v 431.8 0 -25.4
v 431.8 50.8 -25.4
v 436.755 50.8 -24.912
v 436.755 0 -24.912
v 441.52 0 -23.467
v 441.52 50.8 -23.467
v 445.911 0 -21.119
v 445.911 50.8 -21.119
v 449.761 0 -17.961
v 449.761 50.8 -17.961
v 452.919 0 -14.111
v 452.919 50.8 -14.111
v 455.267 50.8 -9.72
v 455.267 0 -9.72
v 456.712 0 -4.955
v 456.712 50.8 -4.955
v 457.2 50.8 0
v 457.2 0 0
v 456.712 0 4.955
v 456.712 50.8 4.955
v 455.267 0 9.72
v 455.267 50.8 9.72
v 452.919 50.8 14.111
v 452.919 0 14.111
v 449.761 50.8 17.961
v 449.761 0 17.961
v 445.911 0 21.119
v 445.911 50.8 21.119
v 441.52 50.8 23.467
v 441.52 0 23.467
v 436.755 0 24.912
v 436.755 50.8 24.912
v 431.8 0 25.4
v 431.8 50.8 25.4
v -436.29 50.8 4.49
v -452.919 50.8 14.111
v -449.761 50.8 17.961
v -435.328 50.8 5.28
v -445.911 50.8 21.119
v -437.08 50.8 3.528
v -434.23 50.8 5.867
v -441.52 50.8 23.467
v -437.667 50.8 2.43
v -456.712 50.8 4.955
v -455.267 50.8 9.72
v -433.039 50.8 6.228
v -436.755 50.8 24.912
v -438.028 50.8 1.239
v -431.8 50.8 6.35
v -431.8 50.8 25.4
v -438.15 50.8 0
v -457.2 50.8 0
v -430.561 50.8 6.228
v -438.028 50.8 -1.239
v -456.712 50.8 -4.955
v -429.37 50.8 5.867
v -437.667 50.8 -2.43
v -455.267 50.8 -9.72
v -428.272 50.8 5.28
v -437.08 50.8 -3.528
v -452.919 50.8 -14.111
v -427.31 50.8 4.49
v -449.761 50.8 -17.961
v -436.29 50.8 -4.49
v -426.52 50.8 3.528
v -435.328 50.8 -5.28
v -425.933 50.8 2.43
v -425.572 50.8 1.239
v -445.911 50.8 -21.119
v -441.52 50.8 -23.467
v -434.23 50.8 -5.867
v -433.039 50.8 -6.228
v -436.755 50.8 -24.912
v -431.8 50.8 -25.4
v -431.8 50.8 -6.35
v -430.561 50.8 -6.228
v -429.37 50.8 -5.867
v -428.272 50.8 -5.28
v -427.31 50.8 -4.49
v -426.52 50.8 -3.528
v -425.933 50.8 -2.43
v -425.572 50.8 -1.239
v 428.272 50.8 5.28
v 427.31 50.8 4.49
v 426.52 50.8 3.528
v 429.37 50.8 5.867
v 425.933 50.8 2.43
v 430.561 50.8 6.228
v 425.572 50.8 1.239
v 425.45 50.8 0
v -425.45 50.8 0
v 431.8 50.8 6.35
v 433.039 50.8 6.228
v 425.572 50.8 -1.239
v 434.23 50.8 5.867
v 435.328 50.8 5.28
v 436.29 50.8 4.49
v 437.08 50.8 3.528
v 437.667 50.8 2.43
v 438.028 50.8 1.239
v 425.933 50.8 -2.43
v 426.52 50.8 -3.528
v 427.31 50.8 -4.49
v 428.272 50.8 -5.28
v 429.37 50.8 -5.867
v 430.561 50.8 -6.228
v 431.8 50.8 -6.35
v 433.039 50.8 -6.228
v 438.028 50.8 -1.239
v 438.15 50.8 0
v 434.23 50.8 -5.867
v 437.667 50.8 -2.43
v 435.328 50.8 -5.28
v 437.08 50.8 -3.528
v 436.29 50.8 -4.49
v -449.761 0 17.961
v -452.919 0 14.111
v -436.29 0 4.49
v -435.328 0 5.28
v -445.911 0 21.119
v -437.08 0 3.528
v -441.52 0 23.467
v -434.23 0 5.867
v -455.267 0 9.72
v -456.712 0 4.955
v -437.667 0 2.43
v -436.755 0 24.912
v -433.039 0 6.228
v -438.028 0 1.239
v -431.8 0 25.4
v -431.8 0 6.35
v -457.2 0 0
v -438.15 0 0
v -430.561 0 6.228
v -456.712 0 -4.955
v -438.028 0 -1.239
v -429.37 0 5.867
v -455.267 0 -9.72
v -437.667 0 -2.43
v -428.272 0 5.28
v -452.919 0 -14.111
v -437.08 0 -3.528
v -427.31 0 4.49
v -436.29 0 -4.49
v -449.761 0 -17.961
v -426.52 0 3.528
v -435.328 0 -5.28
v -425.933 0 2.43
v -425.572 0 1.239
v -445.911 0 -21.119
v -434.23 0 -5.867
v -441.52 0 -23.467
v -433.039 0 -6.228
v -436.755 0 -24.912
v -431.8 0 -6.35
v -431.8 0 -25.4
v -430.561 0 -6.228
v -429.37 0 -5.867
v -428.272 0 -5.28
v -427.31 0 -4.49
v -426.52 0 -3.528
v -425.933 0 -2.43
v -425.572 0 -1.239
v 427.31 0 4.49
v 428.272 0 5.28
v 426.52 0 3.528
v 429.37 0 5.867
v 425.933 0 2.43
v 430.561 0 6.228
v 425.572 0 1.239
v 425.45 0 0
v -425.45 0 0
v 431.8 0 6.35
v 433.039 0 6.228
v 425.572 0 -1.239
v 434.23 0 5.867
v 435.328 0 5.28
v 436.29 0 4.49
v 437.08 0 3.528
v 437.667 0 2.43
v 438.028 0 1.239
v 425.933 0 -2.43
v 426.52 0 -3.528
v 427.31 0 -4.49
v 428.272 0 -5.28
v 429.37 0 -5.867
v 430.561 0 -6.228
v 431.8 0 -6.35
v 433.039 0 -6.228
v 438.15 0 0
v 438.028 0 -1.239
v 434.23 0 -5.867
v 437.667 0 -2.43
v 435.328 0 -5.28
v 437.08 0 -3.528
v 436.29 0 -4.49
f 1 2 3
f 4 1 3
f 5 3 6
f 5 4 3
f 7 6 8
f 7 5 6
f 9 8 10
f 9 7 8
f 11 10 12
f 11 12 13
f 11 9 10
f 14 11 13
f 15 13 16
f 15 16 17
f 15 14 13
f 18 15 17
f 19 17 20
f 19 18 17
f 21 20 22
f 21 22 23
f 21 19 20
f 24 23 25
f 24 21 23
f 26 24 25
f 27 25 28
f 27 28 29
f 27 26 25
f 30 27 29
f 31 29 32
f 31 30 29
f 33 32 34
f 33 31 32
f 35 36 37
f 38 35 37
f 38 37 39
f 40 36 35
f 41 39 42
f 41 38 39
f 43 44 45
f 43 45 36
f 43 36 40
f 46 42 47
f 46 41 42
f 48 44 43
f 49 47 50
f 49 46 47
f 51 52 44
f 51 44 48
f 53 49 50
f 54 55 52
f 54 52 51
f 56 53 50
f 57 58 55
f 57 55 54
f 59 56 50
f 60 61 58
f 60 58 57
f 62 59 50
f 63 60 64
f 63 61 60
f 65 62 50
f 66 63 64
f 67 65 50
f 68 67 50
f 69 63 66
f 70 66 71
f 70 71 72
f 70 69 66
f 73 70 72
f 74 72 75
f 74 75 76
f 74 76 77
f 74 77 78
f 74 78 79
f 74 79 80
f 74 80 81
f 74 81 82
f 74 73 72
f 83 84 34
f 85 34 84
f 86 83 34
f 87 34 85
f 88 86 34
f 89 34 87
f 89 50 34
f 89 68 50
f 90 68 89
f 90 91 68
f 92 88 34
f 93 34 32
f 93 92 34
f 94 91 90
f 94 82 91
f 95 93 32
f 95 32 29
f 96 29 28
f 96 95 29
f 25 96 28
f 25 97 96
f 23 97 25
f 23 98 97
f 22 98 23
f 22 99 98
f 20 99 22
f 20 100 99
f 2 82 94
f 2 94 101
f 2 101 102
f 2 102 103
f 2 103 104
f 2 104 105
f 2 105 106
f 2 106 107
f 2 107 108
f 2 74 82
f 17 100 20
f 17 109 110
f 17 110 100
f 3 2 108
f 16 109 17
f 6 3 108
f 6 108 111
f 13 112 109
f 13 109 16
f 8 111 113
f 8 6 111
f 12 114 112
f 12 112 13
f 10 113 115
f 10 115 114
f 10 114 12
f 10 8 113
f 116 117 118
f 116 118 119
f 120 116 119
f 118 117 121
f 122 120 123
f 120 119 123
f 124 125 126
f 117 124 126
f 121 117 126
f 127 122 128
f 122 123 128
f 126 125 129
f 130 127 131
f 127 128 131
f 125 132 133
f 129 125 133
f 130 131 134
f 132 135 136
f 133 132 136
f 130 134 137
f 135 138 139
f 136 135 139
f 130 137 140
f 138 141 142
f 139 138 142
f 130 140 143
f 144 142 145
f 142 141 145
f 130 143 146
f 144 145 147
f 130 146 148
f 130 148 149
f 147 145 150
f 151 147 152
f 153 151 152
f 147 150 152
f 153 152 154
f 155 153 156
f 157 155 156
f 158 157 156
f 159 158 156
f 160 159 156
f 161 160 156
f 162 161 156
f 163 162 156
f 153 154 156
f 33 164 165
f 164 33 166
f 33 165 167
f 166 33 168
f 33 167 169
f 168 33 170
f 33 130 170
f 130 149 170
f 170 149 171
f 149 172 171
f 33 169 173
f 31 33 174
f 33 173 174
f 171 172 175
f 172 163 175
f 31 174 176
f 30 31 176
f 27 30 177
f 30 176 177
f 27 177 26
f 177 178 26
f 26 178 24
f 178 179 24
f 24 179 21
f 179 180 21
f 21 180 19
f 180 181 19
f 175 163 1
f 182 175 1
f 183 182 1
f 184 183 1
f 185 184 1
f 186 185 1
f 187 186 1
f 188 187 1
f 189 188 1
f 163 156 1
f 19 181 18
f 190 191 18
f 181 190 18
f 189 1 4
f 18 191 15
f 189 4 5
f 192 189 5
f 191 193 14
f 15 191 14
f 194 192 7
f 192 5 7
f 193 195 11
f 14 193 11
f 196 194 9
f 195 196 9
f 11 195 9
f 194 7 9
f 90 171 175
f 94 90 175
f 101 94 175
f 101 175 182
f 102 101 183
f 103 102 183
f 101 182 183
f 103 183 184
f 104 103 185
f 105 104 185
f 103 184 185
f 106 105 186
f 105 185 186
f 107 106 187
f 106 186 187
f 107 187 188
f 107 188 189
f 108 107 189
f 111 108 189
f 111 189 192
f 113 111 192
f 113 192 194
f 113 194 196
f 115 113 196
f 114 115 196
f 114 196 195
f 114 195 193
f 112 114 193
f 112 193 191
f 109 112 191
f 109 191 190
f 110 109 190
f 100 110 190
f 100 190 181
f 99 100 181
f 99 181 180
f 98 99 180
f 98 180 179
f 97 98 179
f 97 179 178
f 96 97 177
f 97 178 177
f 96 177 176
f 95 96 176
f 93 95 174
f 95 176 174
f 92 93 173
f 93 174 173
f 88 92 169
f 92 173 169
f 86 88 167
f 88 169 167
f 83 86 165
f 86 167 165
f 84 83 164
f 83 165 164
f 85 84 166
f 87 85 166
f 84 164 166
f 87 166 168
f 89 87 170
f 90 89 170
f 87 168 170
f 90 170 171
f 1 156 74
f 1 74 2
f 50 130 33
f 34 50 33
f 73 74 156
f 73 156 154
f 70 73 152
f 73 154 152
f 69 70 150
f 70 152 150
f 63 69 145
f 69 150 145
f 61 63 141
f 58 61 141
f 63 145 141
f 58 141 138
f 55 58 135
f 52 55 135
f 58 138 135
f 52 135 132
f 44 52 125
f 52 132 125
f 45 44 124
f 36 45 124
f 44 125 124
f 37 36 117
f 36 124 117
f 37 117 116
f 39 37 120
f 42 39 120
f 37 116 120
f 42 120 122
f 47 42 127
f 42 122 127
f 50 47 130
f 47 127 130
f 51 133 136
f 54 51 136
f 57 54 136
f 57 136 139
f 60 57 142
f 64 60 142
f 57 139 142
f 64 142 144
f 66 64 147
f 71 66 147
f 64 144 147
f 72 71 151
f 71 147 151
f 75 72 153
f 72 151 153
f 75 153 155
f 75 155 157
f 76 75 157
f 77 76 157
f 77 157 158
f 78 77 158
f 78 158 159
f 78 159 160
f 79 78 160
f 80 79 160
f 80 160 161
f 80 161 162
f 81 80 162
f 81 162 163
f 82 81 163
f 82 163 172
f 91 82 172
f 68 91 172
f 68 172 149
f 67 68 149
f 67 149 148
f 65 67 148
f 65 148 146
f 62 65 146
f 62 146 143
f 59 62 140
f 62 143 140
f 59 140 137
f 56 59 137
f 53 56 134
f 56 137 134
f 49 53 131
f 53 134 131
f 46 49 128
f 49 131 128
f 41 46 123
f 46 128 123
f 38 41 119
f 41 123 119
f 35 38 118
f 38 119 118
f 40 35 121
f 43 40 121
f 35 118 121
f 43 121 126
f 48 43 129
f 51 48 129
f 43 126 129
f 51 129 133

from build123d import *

# Parameters (mm, degrees)
SKETCH1_W                  = 863.6
SKETCH1_H                  = 50.8
BOSS_EXTRUDE2_DEPTH        = 50.8
F_1_2_0_5_DIAMETER_HOLE1_D = 12.7


with BuildPart() as part:
    # Sketch1 → Boss-Extrude2 (new body)
    with BuildSketch(Plane(origin=(0, 0, 0), x_dir=(1, 0, 0), z_dir=(0, 1, 0))):
        with BuildLine():
            Line((-431.8, -25.4), (-431.8, 25.4))
            ThreePointArc((-431.8, 25.4), (-457.2, 0), (-431.8, -25.4))
        make_face()
        Rectangle(SKETCH1_W, SKETCH1_H)
        with BuildLine():
            ThreePointArc((431.8, 25.4), (457.2, 0), (431.8, -25.4))
            Line((431.8, -25.4), (431.8, 25.4))
        make_face()
    extrude(amount=BOSS_EXTRUDE2_DEPTH)

    # 1/2 (0.5) Diameter Hole1 (through all)
    with Locations(Plane(origin=(0, 50.8, 0), x_dir=(1, 0, 0), z_dir=(0, 1, 0))):
        with Locations((431.8, 0), (-431.8, 0)):
            Hole(F_1_2_0_5_DIAMETER_HOLE1_D / 2)


solid = part.part
